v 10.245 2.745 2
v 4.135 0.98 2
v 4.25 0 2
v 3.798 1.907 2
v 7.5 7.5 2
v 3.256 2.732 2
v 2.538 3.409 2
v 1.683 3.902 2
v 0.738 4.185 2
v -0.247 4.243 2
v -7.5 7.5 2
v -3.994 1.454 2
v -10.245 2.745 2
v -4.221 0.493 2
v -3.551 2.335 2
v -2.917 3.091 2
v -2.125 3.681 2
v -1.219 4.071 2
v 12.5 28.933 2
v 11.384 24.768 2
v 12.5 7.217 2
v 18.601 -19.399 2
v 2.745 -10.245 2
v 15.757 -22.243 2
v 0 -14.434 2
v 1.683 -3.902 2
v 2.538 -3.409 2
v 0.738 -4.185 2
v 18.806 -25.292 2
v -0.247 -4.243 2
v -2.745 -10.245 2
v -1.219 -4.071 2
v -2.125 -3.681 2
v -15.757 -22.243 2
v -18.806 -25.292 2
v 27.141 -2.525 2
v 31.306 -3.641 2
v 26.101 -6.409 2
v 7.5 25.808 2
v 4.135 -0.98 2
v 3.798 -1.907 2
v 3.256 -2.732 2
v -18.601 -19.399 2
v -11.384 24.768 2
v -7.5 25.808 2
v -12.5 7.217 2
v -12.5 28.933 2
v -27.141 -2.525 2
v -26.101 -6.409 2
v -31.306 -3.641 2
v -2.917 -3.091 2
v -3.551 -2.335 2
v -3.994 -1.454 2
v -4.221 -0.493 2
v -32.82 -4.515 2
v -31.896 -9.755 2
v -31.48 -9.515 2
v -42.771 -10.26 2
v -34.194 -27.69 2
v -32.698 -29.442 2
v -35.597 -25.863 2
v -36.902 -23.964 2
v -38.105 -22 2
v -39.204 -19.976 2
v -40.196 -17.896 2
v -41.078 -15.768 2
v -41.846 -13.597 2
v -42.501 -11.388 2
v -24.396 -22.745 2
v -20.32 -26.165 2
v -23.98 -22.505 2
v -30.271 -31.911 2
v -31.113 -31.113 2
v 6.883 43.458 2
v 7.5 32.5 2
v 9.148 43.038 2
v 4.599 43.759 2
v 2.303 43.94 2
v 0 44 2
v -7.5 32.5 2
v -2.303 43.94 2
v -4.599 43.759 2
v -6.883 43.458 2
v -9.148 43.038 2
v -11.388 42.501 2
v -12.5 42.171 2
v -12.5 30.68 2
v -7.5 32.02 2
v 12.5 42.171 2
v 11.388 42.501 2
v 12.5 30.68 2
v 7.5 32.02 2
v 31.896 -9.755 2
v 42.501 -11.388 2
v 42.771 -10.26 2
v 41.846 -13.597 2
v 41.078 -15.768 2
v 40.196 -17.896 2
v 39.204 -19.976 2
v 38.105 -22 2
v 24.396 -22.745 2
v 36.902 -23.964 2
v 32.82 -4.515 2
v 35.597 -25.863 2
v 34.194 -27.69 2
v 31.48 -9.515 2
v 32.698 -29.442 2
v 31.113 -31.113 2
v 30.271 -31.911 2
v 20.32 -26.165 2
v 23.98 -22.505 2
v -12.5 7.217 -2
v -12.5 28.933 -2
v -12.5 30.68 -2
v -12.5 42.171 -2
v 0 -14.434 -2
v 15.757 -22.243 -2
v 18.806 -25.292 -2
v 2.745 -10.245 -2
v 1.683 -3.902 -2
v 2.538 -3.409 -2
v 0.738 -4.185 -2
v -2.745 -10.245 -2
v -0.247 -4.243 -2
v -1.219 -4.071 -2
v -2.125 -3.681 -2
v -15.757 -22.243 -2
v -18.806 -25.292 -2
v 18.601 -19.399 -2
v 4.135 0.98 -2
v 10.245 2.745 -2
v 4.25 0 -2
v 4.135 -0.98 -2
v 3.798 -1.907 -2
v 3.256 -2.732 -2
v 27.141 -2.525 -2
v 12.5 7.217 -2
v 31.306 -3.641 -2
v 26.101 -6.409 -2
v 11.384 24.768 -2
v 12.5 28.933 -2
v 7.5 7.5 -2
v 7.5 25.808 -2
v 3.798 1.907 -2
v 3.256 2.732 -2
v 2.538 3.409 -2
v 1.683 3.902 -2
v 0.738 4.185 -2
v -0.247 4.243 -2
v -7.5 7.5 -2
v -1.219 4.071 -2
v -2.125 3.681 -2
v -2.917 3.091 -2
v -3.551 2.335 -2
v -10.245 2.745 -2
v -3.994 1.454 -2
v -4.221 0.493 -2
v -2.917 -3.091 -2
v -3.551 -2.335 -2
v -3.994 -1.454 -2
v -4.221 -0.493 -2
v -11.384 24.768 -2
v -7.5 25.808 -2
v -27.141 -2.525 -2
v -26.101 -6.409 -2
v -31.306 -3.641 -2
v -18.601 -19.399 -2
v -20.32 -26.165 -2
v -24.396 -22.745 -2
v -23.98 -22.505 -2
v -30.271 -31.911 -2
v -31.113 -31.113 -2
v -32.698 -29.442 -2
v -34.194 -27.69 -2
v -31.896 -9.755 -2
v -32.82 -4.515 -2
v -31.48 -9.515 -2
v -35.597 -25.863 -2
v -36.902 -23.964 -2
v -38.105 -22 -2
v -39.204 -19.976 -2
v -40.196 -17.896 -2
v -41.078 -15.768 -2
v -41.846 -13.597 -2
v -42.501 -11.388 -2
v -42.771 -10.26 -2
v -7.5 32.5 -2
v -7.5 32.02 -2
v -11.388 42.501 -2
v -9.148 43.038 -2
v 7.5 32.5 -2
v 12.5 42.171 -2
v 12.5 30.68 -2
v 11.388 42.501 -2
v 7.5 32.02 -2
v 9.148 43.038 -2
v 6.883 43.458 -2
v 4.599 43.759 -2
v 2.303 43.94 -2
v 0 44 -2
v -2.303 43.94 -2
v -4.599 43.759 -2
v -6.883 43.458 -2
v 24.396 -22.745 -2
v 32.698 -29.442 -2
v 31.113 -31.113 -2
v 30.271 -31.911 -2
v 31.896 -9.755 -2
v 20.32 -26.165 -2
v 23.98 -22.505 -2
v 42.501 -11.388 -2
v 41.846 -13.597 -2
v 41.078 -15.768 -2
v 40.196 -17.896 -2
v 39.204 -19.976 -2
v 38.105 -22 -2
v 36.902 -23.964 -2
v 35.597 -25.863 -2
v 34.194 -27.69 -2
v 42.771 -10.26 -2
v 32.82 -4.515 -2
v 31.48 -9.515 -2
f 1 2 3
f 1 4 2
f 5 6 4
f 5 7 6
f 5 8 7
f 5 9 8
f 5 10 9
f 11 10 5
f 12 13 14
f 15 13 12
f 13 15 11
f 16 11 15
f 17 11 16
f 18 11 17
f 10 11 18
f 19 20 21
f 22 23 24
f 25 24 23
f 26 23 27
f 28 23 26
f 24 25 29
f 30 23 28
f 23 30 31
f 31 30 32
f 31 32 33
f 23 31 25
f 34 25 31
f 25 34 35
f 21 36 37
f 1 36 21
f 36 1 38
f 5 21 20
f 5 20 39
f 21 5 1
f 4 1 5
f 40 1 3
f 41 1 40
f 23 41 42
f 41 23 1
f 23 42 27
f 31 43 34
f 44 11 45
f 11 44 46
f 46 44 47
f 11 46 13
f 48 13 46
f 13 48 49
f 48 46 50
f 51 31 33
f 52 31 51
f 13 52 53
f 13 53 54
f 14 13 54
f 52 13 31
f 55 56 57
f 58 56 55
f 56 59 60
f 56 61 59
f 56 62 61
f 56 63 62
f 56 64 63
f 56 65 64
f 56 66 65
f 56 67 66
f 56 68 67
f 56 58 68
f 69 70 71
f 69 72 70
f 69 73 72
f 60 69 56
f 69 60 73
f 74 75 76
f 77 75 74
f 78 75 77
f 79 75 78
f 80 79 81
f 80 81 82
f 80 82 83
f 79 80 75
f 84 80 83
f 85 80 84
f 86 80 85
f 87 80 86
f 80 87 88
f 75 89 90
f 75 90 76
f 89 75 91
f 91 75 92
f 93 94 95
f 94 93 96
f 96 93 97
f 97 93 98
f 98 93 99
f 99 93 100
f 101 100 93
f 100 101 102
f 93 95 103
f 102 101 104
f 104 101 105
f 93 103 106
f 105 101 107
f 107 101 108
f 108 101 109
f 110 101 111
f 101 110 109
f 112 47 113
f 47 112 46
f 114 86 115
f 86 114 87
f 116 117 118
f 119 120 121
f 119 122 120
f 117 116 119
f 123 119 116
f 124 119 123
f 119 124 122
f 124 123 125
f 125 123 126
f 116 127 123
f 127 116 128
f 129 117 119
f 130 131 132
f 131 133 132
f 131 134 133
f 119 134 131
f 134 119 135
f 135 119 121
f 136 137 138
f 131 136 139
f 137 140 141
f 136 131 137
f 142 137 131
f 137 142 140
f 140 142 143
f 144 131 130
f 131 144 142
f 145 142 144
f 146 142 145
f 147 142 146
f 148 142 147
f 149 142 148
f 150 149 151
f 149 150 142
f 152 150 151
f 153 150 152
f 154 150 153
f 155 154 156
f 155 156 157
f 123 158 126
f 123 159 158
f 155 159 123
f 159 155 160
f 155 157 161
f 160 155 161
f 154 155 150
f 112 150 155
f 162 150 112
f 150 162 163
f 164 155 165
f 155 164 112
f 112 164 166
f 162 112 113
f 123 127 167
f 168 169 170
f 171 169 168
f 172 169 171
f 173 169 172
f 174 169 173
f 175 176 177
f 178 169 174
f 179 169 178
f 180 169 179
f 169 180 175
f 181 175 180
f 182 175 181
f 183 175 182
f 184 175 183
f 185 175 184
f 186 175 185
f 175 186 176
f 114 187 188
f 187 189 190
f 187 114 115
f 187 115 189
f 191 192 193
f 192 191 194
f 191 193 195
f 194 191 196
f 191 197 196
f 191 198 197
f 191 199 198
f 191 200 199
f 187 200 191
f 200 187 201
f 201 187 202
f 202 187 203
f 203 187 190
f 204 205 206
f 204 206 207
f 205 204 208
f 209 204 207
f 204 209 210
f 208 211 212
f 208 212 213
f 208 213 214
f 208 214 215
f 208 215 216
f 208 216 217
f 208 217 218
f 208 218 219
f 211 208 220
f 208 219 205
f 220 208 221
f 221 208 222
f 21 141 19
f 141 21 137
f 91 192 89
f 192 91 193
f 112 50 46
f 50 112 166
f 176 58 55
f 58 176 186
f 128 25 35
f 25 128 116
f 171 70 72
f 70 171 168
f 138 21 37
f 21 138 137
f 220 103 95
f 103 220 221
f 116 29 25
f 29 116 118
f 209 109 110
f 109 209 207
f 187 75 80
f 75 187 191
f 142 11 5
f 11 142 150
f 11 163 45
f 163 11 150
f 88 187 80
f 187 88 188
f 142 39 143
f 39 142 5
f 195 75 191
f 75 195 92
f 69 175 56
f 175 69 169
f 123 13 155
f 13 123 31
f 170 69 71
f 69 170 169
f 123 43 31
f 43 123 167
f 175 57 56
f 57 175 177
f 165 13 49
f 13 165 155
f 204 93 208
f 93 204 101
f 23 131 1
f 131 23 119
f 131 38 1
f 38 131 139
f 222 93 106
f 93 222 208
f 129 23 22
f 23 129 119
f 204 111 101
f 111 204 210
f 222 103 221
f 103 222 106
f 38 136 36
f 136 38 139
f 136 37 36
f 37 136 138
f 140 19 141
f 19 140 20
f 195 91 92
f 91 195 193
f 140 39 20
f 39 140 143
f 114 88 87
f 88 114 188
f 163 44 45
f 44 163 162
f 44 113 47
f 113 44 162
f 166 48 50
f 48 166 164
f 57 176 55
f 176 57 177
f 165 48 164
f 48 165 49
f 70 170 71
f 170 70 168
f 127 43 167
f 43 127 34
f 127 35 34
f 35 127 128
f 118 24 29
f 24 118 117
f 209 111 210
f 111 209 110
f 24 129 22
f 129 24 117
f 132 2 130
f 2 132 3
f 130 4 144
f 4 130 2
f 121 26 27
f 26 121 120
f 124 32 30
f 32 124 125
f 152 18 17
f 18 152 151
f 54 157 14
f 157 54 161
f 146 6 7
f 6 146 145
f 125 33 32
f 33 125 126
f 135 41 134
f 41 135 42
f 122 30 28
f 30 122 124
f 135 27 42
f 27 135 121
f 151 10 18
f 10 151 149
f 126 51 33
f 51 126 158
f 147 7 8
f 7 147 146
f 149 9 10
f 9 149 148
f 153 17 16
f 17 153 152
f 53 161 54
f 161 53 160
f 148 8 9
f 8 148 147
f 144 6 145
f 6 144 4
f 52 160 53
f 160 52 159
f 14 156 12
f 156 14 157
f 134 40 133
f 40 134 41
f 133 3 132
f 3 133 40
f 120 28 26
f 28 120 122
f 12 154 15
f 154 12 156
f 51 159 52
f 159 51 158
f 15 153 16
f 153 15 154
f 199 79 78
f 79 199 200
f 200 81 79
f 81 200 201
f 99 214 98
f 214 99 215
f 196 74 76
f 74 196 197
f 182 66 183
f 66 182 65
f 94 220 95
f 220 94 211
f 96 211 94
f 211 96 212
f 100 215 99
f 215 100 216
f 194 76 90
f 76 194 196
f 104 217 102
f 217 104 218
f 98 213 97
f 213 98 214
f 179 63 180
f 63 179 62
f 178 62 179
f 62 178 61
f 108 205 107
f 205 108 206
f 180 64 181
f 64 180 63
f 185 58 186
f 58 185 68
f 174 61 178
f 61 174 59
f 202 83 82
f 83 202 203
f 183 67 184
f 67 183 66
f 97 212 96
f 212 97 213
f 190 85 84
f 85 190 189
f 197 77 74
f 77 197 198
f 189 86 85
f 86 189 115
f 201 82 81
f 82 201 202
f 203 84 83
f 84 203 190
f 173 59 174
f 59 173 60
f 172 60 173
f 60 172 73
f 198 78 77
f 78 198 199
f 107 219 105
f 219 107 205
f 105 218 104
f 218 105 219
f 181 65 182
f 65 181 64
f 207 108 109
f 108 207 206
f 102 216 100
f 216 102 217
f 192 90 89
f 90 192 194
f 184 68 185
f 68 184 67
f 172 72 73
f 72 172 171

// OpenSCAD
// file: ../configuration.scad
$fa = 2;
$fs = 0.5;

motor_end_height=44;
idler_end_height=28;
carriage_height=13.8;
platform_thickness=10;
platform_fix_dia=28;
platform_dia=38;

bearing_diameter=16;
bearing_dia_clearence=0.5;
bearing_free_dia_clearence=0.8;

hotend_diameter=16.4;
hotend_groove_dia=12;

// Frames

// Places mounting holes for the controller
// 33 = RAMPS 1.3 (Power outputs: Extruder, Bed, Fan)
// 34 = RAMPS 1.3 (Power outputs: Extruder0, Extruder1, Bed)
// 35 = RAMPS 1.3 (Power outputs: Extruder, Fan, Fan)
// 70 = Megatronics
// 701 = Megatronics 2.0

motherboard=35;

frame_thickness=8;

// Distance from motor axle to idler axle
// Calculated regarding length of the HTD3M closed belt 
belt_tooth=354;
spacing = round(((belt_tooth*3) - 3.14159 * 24.83) / 2);

rod_length=spacing+55;
rod_diameter=8;
//platform_hinge_offset=25;
//carriage_hinge_offset=17;

printbed_diameter=170;	//printable aera
printbed_thickness=4;		// used for rendering and approximating build volume


//corner_radius=12;
//frame_radius=(tower_radius-rod_diameter/2-corner_radius)/cos(30);

ball_link_distance=40;//55;
ball_offset=6.5;
ball_distance=ball_link_distance-2*ball_offset;
ball_angle=25;

// Delta Settings

delta_smooth_rod_offset=139.5;//140 - 152 floor(printbed_diameter/(2*sin(ball_angle))-printbed_diameter/2+delta_effector_offset+delta_carriage_offset)
delta_effector_offset=18;
delta_carriage_offset=18;
delta_diagonal_rod=ceil(max(printbed_diameter/2+delta_smooth_rod_offset-delta_effector_offset-delta_carriage_offset,printbed_diameter/(2*sin(ball_angle))));
//|-> 202
delta_radius=(delta_smooth_rod_offset-delta_effector_offset-delta_carriage_offset);

diagonal_rod_length=delta_diagonal_rod-2*8;//165
diagonal_rod_diameter=3;
diagonal_rod_length_lost=(printbed_diameter/(2*sin(ball_angle)))-(printbed_diameter/2+delta_smooth_rod_offset-delta_effector_offset-delta_carriage_offset);

diagonal_rod_angle=acos(delta_radius/delta_diagonal_rod);

echo_result=true;

carriage_altitude=sqrt(pow(delta_diagonal_rod,2)-pow(delta_radius,2));



if(echo_result) {
	echo("printbed_diameter",printbed_diameter);
	echo("delta_diagonal_rod",delta_diagonal_rod);
	echo("diagonal_rod_length",diagonal_rod_length);
	echo("delta_effector_offset",delta_effector_offset);
	echo("delta_carriage_offset",delta_carriage_offset);
	echo("delta_radius",delta_radius);
	echo("diagonal_rod_angle",diagonal_rod_angle);
	echo("carriage_altitude",carriage_altitude);
	echo("diagonal_rod_length_lost",diagonal_rod_length_lost);
	echo("delta_smooth_rod_offset_optimum",printbed_diameter/(2*sin(ball_angle))-printbed_diameter/2+delta_effector_offset+delta_carriage_offset);
	echo("rod_length",rod_length);
}
// main file
include <../configuration.scad>

$fa=3;
$fs=1;

diagonal_rod_holder();

module diagonal_rod_holder() {
	color("purple") intersection() {
		difference() {
			for(a = [1:3]){
				rotate([0,0,a*120-30]) translate([30,0,0]) cube([60,25,4],true);
			}
			for(a = [1:3]){
				rotate([0,0,a*120-30]) translate([20,0,0]) cube([25,15,6],true);
			}
			for(a = [1:3]){
				rotate([0,0,a*120]) union() {
					for(x = [-1,1]) {
						translate([x*ball_link_distance/2,-delta_effector_offset,0]) cylinder(h = 30, r=diagonal_rod_diameter/2+0.1, center = true);
						translate([x*ball_link_distance/2,-delta_effector_offset,-5]) rotate([0,0,-135]) cube([6,6,10],false);
					}
				}
			}
			cylinder(h = 10, r = 8.5/2, center = true);
		}
		cylinder(h = 10, r =44, center = true);
	}
}
